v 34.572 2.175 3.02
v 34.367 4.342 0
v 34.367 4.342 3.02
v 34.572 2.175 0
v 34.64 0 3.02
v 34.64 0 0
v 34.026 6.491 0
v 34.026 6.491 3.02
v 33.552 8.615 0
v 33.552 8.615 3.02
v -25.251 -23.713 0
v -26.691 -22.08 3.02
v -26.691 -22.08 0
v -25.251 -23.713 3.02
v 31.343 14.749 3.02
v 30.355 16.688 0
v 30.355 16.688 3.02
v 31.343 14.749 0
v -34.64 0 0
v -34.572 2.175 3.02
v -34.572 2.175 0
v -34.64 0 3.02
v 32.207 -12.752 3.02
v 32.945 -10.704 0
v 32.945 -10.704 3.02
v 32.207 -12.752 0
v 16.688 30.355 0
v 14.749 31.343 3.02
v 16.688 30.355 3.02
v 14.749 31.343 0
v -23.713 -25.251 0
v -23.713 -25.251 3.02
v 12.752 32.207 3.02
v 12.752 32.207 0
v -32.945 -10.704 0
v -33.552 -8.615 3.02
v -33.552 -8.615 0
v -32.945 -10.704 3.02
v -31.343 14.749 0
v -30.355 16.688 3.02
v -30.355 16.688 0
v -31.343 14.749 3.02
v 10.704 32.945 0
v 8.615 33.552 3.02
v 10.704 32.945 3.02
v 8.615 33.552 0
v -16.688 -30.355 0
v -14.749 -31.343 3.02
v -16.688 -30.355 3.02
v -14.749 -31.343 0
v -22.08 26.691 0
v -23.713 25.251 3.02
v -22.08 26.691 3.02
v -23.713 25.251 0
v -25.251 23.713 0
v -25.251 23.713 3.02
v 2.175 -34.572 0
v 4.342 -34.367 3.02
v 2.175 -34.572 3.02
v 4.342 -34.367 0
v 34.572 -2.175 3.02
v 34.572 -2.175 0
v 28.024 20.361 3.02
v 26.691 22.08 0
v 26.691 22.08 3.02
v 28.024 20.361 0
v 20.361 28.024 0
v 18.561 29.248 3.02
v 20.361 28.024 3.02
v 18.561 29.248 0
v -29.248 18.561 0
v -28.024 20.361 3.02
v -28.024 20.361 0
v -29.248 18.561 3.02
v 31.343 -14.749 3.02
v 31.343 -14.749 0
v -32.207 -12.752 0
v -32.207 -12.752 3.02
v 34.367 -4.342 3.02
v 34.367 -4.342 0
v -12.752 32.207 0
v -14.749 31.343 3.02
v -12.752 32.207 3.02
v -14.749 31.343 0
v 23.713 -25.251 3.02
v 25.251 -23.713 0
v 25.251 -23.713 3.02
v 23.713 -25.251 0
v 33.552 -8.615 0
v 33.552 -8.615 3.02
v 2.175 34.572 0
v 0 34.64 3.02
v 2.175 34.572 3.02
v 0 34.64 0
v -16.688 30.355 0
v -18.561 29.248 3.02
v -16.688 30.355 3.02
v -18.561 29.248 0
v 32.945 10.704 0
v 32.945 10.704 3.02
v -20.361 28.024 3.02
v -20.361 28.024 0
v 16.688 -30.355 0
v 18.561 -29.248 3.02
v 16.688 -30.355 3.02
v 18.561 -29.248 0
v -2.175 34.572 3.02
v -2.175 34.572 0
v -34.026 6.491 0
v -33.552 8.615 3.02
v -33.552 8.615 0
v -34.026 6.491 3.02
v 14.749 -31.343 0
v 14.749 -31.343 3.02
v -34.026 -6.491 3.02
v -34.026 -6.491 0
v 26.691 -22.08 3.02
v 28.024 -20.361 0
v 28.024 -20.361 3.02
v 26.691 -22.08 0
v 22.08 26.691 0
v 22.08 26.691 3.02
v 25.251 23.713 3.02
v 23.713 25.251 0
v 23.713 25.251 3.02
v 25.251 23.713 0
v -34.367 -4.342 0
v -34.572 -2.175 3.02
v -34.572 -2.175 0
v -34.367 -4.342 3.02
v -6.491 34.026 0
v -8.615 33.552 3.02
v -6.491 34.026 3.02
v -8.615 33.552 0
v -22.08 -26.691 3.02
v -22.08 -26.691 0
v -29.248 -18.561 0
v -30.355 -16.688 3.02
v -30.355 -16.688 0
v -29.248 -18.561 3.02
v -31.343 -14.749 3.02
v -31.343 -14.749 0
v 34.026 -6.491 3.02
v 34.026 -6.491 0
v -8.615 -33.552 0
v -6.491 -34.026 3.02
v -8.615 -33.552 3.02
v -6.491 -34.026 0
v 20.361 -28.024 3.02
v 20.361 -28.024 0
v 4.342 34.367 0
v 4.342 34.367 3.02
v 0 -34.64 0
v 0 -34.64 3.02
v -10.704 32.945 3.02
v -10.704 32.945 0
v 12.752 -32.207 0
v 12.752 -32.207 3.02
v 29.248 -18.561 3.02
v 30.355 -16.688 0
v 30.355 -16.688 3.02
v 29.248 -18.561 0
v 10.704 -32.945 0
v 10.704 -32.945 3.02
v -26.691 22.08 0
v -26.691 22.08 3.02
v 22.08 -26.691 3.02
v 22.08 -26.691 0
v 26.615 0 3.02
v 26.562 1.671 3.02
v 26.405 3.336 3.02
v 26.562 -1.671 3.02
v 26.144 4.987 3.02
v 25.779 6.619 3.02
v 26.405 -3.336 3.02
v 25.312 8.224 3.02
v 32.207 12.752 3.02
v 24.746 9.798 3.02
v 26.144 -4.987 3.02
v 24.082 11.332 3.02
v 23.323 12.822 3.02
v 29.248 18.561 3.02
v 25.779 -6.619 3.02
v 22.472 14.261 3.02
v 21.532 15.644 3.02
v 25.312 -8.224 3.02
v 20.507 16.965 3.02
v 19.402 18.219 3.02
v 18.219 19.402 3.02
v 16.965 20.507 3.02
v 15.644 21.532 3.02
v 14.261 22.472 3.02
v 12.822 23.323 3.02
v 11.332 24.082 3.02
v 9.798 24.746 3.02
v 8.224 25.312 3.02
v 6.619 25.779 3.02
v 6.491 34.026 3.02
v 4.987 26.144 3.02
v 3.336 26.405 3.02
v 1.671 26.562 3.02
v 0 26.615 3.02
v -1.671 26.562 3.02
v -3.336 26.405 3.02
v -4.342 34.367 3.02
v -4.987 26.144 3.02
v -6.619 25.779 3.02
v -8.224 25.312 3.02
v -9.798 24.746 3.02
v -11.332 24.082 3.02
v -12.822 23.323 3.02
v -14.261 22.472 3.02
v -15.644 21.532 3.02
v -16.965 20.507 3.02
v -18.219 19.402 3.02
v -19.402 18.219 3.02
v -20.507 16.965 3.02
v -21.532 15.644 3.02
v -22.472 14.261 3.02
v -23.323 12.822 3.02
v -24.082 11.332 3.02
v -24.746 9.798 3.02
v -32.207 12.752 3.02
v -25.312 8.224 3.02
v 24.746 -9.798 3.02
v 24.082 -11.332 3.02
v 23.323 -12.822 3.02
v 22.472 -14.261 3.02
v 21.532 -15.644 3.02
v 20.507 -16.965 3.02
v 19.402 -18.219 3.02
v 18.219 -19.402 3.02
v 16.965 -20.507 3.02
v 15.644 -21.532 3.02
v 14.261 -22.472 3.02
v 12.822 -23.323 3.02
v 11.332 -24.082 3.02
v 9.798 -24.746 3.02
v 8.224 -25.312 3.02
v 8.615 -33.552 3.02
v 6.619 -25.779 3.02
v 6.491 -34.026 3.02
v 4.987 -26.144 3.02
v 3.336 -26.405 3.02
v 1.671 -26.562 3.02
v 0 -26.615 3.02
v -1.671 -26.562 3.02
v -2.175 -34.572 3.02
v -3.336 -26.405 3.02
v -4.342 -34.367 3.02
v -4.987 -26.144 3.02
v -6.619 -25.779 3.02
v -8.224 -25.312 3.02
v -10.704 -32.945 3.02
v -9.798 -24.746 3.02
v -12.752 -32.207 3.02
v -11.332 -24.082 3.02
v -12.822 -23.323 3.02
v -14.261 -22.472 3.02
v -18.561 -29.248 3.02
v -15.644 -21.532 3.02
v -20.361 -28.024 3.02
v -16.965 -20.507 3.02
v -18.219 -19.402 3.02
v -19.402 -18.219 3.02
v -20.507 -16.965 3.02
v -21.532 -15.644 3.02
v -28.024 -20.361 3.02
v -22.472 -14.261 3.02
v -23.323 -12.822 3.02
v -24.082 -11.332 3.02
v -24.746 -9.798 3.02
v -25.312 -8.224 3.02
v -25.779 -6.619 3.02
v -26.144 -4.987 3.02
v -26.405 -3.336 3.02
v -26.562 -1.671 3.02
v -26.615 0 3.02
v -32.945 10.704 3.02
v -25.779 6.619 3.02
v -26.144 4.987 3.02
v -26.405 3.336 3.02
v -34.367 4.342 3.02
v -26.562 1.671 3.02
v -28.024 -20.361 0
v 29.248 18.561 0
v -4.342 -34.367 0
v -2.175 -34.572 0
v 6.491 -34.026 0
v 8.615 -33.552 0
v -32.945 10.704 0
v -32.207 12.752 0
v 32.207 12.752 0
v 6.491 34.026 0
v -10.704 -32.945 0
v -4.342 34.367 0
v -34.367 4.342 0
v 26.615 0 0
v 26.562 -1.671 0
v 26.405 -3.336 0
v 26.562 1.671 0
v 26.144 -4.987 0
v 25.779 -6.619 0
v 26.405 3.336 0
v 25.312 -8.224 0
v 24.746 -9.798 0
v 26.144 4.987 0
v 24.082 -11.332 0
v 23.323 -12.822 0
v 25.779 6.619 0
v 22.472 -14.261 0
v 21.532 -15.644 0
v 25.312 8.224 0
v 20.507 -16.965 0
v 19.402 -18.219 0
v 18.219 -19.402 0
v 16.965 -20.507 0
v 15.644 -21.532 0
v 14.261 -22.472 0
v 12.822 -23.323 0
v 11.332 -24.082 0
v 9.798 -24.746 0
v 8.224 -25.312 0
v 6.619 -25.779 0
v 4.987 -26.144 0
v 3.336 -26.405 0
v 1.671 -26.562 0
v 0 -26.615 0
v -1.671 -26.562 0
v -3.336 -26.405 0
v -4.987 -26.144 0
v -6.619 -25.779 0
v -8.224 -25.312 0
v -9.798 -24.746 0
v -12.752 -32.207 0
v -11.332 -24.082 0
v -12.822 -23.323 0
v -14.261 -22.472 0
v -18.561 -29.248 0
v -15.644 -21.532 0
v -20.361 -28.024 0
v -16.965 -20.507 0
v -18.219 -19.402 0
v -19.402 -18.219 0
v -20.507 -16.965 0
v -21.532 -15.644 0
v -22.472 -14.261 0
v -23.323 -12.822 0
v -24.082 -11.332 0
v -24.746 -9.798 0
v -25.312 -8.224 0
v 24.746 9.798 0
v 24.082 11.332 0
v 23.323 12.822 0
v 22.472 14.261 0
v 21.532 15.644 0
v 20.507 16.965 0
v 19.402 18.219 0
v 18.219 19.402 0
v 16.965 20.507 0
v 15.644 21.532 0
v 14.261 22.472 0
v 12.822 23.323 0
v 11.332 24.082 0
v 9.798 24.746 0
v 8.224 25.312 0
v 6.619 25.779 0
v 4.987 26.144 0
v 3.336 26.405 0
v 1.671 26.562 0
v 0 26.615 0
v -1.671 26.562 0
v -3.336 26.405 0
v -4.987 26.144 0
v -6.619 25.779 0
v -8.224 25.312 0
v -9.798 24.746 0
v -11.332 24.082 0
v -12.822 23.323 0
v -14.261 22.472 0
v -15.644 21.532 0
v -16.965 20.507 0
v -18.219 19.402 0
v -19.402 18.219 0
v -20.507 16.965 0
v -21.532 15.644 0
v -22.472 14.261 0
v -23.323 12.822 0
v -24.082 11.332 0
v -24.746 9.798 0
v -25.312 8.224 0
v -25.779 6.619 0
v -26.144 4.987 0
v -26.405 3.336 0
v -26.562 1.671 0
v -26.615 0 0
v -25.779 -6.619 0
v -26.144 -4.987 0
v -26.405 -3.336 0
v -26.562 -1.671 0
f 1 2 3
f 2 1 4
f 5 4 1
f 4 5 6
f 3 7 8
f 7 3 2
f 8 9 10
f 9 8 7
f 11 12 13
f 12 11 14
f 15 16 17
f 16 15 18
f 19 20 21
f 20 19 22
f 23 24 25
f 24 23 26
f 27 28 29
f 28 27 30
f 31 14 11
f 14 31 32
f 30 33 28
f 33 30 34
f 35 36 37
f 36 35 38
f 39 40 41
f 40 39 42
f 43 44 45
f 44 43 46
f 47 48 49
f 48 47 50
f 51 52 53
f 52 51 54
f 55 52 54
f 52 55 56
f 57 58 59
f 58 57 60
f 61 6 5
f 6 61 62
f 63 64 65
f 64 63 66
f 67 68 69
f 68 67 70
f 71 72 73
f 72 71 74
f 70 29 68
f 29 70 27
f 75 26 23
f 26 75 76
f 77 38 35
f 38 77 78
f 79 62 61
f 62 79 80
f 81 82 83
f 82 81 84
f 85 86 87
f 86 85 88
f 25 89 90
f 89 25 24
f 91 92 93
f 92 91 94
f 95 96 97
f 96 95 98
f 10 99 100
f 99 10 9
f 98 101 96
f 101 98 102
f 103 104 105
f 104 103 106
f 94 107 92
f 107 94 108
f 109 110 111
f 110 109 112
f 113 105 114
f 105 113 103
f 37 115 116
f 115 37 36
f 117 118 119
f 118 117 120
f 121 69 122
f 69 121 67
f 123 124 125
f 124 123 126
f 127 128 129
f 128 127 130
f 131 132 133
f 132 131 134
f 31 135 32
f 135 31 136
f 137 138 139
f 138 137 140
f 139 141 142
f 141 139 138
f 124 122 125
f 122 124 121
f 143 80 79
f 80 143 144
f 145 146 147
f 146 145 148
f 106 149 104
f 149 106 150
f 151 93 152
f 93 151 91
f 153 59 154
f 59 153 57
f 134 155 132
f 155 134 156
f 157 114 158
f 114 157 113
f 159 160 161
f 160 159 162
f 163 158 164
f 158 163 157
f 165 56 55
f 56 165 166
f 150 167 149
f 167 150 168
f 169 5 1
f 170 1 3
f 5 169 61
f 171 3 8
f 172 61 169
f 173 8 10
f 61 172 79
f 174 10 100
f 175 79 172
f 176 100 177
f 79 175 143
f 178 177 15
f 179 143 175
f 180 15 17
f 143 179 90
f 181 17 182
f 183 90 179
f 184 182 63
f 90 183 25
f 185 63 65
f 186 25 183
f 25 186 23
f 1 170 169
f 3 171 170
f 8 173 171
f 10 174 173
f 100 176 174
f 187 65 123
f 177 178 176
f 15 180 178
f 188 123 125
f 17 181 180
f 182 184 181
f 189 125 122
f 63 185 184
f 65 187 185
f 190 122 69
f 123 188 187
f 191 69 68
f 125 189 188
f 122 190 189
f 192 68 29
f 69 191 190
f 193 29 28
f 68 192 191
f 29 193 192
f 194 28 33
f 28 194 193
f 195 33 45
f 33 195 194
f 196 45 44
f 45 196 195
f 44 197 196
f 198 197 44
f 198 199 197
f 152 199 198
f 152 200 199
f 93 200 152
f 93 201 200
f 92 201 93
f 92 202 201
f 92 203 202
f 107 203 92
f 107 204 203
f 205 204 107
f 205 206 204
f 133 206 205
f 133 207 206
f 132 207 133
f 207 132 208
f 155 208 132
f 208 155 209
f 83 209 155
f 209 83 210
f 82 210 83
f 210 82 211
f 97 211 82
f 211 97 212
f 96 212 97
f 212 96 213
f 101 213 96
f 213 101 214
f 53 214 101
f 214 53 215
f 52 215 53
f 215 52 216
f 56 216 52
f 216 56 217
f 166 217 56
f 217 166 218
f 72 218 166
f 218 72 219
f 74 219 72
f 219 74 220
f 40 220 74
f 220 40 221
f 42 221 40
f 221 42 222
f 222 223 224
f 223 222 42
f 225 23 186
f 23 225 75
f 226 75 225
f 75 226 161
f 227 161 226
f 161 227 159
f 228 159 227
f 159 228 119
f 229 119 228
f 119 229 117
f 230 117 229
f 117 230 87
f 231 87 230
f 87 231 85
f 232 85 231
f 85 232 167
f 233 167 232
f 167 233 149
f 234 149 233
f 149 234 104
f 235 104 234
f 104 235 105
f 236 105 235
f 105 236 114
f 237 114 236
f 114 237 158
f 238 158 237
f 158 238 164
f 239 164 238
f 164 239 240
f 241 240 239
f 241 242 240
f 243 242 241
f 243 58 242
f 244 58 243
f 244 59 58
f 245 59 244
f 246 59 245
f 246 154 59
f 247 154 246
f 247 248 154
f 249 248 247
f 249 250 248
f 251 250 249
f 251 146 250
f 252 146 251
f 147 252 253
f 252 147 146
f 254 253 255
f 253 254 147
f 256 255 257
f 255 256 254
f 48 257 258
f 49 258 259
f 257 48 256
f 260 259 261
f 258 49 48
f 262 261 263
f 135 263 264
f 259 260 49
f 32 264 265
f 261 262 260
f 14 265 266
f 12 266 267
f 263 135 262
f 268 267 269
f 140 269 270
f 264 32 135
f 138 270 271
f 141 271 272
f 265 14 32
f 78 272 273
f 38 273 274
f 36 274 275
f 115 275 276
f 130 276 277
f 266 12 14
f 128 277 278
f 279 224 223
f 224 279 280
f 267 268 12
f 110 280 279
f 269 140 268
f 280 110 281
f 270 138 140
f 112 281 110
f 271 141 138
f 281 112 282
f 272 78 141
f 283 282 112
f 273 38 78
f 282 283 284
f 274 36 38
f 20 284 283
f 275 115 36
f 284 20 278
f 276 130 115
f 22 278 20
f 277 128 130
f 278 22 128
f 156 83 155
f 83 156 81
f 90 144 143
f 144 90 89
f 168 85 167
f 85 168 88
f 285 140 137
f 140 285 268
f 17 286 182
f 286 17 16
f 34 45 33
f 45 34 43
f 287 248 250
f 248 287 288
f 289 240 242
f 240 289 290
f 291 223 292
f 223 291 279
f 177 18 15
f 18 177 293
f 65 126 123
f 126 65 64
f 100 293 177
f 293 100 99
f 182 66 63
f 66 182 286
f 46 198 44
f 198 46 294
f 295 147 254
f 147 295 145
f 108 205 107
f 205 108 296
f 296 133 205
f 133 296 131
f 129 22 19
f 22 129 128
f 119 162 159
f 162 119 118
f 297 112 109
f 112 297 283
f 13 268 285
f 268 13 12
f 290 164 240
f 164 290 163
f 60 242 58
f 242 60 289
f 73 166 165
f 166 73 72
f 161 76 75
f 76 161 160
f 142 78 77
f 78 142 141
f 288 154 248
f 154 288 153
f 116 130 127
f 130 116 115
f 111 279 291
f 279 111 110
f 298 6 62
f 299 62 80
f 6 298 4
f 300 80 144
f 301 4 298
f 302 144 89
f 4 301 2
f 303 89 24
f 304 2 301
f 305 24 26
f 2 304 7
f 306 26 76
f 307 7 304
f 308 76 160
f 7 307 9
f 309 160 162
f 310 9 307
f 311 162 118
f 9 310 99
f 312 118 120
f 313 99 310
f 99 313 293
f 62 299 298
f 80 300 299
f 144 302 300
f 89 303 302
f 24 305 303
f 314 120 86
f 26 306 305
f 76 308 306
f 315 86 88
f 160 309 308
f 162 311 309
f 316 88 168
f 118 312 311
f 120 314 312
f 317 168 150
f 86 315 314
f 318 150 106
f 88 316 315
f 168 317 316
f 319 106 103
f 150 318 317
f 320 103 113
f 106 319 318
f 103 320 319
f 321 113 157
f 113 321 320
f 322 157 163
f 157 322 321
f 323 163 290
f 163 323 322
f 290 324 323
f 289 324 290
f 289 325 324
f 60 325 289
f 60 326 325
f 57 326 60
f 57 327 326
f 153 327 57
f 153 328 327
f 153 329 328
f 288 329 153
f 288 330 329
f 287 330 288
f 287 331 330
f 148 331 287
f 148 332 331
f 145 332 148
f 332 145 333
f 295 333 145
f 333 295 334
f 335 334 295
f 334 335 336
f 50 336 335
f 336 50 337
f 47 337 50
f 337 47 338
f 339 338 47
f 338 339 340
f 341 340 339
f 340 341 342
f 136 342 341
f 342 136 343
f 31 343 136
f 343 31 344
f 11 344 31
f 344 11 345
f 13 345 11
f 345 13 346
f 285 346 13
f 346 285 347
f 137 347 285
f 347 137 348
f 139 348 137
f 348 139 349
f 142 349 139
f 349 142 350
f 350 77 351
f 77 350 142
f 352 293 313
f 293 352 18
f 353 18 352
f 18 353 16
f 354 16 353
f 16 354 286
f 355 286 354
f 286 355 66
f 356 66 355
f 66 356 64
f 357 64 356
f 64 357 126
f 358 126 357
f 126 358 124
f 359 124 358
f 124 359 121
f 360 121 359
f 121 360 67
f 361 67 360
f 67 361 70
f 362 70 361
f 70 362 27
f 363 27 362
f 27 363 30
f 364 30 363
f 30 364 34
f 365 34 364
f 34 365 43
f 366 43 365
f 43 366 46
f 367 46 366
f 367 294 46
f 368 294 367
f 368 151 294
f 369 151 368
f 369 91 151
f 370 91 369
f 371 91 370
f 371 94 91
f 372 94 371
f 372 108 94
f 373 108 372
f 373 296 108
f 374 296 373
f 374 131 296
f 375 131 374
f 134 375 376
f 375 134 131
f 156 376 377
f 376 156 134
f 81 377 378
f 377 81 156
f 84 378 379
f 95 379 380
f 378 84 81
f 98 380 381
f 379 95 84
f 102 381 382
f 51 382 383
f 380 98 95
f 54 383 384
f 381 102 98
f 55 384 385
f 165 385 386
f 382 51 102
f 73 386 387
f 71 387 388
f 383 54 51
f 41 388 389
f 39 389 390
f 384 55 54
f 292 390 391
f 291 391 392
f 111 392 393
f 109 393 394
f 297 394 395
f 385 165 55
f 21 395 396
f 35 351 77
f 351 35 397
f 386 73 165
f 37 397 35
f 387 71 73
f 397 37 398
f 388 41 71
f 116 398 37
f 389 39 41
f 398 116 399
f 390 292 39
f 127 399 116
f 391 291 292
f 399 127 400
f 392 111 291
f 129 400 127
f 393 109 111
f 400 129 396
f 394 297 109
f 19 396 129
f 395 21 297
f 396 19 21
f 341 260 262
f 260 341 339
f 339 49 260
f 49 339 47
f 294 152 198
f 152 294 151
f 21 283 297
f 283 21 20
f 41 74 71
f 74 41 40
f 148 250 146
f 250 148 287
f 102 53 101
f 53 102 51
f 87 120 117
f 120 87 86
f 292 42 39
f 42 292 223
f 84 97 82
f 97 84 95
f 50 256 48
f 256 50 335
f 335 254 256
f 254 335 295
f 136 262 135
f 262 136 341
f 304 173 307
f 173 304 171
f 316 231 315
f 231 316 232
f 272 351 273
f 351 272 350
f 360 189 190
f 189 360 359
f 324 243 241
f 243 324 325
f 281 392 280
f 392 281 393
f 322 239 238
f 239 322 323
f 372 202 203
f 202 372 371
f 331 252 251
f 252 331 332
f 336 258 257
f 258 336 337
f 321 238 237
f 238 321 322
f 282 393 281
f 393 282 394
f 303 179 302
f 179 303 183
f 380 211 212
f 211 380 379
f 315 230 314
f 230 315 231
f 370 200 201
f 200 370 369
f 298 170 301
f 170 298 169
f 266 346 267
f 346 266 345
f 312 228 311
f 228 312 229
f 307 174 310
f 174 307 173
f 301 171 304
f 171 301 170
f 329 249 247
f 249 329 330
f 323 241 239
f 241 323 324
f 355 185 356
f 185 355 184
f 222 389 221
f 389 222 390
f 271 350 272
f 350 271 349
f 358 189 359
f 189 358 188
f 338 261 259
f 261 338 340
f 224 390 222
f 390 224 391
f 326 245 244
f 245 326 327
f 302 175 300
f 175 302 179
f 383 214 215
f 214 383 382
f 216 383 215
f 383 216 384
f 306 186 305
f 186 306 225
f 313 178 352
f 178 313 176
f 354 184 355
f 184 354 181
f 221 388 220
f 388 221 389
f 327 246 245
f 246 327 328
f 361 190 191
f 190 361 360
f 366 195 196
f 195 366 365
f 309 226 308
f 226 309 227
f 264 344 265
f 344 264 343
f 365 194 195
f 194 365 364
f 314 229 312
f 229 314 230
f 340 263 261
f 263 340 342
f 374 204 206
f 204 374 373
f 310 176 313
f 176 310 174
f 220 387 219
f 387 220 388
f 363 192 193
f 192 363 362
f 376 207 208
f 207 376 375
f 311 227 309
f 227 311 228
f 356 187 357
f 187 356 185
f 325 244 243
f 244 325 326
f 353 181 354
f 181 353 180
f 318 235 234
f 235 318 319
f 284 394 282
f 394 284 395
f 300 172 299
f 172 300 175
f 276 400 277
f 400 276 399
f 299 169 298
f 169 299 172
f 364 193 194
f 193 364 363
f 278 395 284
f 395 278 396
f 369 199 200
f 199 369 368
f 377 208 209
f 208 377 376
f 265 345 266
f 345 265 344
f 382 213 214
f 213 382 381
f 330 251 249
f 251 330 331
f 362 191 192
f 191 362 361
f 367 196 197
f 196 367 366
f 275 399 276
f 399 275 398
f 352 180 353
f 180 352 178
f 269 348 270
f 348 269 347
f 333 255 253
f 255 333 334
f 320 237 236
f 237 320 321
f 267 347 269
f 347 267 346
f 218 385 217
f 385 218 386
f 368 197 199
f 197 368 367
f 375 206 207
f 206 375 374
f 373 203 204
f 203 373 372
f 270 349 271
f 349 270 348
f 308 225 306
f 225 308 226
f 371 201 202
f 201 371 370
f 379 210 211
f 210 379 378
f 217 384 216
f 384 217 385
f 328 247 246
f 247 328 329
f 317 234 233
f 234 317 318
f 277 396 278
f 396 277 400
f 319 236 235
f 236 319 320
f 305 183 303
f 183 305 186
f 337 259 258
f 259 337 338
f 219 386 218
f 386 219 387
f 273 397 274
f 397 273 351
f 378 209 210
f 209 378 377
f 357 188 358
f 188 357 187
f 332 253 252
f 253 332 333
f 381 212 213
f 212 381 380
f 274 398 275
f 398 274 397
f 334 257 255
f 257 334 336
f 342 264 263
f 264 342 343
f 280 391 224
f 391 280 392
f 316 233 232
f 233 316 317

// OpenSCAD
/*
Description: As it looks like Trucore hardware is no longer available, this is an attempt to model the truCore motors so that rocketers can get spare parts with help from a machinist
Author: Boris du Reau
Date: 23/07/2018
motor type: 76 mm 
part: Washer
This is used for all the 76mm motors
washer outside diameter: 69.28 mm
washer height: 3.02 mm
washer inside diameter: 53.23 mm
*/

$fn=100;
difference () {cylinder (r= 69.28/2, h = 3.02);
cylinder (r=53.23/2, h = 10);
}
